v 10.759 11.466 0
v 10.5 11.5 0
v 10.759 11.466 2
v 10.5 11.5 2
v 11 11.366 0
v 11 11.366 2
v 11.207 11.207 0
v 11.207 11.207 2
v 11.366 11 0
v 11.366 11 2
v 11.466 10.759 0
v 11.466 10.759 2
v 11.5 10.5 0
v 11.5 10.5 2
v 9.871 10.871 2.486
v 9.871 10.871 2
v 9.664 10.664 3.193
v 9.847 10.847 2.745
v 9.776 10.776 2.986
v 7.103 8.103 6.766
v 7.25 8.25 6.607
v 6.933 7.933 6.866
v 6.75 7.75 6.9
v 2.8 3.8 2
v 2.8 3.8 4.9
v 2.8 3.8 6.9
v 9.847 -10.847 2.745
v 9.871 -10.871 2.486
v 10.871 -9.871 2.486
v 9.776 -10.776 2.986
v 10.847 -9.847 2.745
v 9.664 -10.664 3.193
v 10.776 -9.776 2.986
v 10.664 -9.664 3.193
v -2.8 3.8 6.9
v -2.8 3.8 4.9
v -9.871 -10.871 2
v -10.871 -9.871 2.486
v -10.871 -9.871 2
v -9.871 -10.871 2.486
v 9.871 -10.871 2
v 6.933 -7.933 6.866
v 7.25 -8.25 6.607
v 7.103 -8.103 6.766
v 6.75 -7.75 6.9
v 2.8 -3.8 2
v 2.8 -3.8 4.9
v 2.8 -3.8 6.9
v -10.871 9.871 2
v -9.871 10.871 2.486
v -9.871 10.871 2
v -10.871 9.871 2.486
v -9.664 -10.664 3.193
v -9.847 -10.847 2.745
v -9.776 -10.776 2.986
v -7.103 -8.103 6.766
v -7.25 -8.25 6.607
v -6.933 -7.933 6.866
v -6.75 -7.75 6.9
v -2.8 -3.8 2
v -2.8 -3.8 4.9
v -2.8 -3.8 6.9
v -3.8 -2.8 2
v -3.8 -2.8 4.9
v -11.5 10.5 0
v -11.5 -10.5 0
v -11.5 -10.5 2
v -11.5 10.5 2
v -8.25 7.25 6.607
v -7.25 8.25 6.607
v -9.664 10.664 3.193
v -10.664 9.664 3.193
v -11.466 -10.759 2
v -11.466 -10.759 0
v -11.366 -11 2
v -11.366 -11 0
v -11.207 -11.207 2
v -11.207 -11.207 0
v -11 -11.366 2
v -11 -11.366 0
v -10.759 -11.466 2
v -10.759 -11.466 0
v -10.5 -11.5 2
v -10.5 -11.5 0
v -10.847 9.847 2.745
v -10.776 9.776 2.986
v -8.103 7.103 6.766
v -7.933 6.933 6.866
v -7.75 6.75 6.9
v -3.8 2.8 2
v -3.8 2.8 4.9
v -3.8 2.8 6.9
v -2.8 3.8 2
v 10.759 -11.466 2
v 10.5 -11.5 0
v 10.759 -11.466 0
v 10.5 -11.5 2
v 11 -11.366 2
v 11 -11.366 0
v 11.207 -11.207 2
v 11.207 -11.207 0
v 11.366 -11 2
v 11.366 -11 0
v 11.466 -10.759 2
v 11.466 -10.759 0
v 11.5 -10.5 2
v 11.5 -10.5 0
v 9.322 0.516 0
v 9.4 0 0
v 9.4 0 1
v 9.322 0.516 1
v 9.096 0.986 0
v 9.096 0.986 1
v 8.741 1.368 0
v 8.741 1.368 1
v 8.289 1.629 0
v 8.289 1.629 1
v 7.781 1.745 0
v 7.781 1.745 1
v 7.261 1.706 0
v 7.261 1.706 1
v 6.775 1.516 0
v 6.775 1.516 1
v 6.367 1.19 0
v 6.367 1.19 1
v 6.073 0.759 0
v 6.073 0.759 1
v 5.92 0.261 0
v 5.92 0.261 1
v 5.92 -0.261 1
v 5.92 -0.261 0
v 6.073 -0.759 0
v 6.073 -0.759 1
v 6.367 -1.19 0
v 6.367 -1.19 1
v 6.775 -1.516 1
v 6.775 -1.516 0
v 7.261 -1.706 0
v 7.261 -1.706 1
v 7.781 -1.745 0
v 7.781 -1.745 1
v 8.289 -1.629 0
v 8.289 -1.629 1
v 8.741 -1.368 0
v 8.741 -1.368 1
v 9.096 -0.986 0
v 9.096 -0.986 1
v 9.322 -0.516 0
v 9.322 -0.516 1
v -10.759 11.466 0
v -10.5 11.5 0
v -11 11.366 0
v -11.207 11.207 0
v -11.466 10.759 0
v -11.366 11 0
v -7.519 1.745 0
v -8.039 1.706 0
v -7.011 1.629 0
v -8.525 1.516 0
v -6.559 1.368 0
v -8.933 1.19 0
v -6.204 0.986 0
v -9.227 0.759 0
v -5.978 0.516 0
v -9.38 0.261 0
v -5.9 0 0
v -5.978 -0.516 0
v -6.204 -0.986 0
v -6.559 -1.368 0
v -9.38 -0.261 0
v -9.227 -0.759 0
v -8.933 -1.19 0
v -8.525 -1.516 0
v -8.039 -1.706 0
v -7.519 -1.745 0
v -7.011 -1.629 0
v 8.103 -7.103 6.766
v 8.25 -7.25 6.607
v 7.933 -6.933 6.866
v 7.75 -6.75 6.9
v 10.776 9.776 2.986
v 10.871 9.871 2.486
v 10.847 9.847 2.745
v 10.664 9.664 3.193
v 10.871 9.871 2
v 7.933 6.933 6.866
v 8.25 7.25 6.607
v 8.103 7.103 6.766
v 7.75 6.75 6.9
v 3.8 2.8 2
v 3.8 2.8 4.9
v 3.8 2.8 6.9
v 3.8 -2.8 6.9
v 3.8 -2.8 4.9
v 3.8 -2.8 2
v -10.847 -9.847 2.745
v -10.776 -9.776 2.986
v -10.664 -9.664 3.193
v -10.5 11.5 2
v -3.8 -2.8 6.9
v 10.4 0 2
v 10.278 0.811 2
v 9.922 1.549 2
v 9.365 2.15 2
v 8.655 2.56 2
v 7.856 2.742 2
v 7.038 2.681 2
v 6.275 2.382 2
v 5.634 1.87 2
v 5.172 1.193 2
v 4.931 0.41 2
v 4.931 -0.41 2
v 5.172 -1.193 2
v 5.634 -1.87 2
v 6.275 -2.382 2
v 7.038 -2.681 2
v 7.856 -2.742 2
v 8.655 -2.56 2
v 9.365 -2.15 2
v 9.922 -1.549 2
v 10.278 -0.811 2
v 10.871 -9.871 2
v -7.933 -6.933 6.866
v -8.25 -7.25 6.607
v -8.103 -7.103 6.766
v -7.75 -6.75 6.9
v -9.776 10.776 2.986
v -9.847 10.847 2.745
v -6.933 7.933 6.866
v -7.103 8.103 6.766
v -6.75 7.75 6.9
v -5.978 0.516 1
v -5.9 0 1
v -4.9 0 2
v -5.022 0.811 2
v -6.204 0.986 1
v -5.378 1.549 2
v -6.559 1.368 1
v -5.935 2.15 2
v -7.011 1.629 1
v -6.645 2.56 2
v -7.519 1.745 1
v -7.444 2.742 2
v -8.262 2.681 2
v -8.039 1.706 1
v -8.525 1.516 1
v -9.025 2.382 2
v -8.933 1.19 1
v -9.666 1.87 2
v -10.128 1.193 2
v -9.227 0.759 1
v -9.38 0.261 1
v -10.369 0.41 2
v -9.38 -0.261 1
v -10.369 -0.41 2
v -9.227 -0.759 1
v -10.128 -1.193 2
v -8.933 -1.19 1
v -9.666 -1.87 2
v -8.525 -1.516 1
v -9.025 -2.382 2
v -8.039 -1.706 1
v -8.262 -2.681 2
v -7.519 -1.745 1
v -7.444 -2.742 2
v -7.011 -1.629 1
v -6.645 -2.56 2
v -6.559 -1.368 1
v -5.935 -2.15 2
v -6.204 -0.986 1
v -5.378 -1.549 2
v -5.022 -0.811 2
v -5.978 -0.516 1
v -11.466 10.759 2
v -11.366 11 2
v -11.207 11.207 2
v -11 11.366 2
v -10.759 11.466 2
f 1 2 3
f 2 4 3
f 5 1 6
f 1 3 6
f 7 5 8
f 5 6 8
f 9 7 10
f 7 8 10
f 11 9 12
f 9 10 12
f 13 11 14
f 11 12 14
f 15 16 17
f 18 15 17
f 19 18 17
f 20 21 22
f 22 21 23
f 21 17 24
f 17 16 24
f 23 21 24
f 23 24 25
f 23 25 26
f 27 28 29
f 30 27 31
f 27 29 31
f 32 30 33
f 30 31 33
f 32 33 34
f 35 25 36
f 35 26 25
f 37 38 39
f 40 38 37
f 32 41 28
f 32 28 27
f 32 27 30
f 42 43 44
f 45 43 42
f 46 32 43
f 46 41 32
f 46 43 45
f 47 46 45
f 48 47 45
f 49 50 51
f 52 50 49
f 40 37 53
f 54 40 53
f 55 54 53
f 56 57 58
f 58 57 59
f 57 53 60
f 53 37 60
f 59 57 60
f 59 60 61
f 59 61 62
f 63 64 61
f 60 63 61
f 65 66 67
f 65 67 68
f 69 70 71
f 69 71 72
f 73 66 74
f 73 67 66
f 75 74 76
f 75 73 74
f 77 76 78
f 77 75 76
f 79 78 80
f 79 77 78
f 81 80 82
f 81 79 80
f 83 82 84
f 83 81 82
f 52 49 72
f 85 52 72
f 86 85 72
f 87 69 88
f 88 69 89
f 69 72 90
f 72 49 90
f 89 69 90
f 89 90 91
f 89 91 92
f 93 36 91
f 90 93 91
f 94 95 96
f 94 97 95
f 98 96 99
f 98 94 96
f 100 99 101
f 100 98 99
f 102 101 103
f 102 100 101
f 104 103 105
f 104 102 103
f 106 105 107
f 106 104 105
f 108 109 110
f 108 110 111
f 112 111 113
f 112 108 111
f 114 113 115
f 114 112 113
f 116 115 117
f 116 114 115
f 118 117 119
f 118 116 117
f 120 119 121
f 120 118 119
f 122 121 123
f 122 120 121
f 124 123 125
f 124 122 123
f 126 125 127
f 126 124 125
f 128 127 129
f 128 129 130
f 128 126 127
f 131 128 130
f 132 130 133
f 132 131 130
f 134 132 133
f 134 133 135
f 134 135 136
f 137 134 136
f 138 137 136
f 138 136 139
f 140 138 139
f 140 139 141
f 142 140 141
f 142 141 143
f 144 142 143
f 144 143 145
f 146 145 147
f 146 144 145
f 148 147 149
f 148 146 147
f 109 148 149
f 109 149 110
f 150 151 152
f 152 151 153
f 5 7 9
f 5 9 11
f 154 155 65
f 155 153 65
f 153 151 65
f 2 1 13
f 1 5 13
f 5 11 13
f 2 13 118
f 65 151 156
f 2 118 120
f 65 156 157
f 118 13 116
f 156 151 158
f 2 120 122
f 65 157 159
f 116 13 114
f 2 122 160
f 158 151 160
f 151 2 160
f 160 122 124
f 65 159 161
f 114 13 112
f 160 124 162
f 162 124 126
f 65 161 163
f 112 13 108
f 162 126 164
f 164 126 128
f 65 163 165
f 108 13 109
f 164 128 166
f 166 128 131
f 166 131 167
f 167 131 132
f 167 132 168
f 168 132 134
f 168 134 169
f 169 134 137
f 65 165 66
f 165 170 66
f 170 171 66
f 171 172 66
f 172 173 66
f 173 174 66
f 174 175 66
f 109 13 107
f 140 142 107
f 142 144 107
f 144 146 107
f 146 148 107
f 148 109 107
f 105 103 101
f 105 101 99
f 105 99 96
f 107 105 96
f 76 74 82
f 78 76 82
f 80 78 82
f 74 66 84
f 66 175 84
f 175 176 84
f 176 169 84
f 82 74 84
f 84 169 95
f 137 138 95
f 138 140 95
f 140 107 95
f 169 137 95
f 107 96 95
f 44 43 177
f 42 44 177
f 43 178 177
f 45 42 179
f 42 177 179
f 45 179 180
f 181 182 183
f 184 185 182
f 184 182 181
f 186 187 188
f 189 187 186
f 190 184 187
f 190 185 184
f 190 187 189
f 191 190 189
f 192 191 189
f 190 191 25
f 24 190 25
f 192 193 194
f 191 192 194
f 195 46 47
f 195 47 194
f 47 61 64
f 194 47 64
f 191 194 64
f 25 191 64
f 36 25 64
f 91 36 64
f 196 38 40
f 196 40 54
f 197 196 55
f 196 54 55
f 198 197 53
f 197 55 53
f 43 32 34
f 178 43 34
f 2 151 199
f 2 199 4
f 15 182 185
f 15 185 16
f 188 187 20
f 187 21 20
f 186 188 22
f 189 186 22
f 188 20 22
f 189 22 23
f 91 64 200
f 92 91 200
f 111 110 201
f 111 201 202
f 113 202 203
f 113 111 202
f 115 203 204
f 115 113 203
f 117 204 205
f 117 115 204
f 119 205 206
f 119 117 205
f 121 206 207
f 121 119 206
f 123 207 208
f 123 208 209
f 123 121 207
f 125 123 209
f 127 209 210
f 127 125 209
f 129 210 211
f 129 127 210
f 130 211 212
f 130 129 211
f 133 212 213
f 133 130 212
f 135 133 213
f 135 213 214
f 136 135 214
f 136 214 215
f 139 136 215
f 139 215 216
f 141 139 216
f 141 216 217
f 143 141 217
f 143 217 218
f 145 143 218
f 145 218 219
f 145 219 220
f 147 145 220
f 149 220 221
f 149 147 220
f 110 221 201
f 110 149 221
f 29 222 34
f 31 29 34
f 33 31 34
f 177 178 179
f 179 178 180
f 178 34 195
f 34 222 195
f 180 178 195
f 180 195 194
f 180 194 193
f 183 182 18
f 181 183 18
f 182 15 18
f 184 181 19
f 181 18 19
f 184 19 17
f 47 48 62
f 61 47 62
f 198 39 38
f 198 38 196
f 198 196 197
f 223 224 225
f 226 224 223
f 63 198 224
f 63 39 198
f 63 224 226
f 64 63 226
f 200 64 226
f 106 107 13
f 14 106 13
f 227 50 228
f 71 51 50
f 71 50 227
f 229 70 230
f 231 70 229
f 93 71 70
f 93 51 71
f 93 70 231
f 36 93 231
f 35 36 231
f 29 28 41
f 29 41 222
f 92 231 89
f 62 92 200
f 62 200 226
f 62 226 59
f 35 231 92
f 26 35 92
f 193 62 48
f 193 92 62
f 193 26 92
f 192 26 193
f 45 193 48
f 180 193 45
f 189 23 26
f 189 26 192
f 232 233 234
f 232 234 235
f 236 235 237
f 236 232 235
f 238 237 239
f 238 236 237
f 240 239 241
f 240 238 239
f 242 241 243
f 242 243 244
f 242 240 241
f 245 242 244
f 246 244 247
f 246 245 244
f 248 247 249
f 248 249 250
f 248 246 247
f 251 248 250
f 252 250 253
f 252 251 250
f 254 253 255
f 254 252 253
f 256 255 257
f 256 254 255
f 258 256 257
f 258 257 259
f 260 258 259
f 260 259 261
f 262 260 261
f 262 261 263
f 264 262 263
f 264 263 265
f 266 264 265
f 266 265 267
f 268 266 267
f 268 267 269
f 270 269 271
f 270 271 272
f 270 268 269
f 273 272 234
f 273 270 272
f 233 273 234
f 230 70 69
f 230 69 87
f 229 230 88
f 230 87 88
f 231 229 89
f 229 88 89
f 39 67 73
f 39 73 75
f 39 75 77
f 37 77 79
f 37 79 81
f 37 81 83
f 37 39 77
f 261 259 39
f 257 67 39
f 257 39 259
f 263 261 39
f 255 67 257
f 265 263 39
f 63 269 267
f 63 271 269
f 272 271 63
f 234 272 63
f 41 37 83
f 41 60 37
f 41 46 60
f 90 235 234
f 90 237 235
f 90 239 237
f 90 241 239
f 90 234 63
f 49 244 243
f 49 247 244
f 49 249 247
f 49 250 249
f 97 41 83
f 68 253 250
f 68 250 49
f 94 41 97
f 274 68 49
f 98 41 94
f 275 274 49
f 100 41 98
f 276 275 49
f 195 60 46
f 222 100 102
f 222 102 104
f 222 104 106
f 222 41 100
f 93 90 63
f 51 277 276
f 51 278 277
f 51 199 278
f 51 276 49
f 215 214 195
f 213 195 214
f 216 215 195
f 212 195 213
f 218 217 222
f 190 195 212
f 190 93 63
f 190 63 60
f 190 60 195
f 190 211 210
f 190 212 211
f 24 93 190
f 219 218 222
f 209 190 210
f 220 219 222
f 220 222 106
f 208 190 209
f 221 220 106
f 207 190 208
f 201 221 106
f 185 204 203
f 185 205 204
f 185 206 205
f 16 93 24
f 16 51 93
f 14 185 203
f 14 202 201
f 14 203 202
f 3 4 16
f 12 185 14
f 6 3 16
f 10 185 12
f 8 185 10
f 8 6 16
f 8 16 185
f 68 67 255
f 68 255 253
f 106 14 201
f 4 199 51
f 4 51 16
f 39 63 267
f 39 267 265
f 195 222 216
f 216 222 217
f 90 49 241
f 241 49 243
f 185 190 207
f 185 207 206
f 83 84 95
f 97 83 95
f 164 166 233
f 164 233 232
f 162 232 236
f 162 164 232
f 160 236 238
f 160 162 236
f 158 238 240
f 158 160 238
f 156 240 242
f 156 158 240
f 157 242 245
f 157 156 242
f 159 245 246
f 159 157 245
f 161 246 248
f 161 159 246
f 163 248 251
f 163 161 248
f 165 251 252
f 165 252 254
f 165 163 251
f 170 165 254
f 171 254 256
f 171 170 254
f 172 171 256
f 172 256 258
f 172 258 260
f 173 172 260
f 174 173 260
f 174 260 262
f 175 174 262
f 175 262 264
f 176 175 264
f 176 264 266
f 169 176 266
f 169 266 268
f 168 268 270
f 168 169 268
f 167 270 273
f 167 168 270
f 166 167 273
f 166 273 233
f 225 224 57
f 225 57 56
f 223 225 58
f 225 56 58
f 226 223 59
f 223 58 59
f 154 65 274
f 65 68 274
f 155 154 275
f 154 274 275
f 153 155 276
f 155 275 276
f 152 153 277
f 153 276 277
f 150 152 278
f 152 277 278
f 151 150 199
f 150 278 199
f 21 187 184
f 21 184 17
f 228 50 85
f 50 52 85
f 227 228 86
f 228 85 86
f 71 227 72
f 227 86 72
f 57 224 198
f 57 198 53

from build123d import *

# Parameters (mm, degrees)
SKETCH_W           = 23
SKETCH_H           = 23
SKETCH_R           = 1.75
PAD_DEPTH          = 2
FILLET_R           = 1
CHAMFER_SIZE       = 1
PAD002_DEPTH       = 3.8
CHAMFER002_SIZE    = 1
SKETCH003_W        = 1.414214
SKETCH003_H        = 6.9
PAD003_DEPTH       = 10
POLARPATTERN_COUNT = 4
CHAMFER003_SIZE    = 4
SKETCH004_W        = 2.365725
SKETCH004_H        = 2.9
POCKET_DEPTH       = 11.501
POCKET_DEPTH_BACK  = -11.501
FILLET001_R        = 1


with BuildPart() as part:
    # Sketch → Pad (new body)
    with BuildSketch(Plane.XY):
        Rectangle(SKETCH_W, SKETCH_H)
        with Locations((-7.65, 0)):
            Circle(SKETCH_R, mode=Mode.SUBTRACT)
        with Locations((7.65, 0)):
            Circle(SKETCH_R, mode=Mode.SUBTRACT)
    extrude(amount=PAD_DEPTH)

    # Fillet
    fillet_edges = [part.edges().sort_by_distance(p)[0] for p in [
        (-11.5, 11.5, 1),
        (-11.5, -11.5, 1),
        (11.5, -11.5, 1),
        (11.5, 11.5, 1),
    ]]
    fillet(fillet_edges, radius=FILLET_R)

    # Chamfer
    chamfer_edges = [part.edges().sort_by_distance(p)[0] for p in [
        (-9.4, 0, 2),
        (5.9, 0, 2),
    ]]
    chamfer(chamfer_edges, length=CHAMFER_SIZE)

    # Sketch002 → Pad002 (join, symmetric)
    with BuildSketch(Plane.XZ):
        Polygon((-3.8, 6.9), (3.8, 6.9), (3.8, 4.9), (0.340708, 4.9), (0.340708, 0), (-0.340708, 0), (-0.340708, 4.9), (-3.8, 4.9), align=None)
    extrude(amount=PAD002_DEPTH, both=True)

    # Chamfer002
    chamfer002_edges = [part.edges().sort_by_distance(p)[0] for p in [
        (-3.8, -3.8, 5.9),
        (-3.8, 3.8, 5.9),
        (3.8, -3.8, 5.9),
        (3.8, 3.8, 5.9),
    ]]
    chamfer(chamfer002_edges, length=CHAMFER002_SIZE)

    # Sketch003 (on Face3 of Chamfer002) → Pad003 (join)
    with BuildSketch(Plane(origin=(-3.3, -3.3, 0), x_dir=(0.707107, -0.707107, 0), z_dir=(-0.707107, -0.707107, 0))):
        with Locations((0, 3.45)):
            Rectangle(SKETCH003_W, SKETCH003_H)
    pad003 = extrude(amount=PAD003_DEPTH)

    # PolarPattern: Pad003 ×4 about axis
    polarpattern_axis = Axis((0, 0, 0), (0, 0, 1))
    for i in range(1, POLARPATTERN_COUNT):
        add(pad003.rotate(polarpattern_axis, i * 360 / POLARPATTERN_COUNT))

    # Chamfer003
    chamfer003_edges = [part.edges().sort_by_distance(p)[0] for p in [
        (10.371068, -10.371068, 6.9),
        (10.371068, 10.371068, 6.9),
        (-10.371068, 10.371068, 6.9),
        (-10.371068, -10.371068, 6.9),
    ]]
    chamfer(chamfer003_edges, length=CHAMFER003_SIZE)

    # Sketch004 → Pocket (cut, two sides)
    with BuildSketch(Plane.XZ) as pocket_sk:
        with Locations((0.122459, 3.45)):
            Rectangle(SKETCH004_W, SKETCH004_H)
    extrude(amount=-POCKET_DEPTH, mode=Mode.SUBTRACT)
    extrude(pocket_sk.sketch, amount=-POCKET_DEPTH_BACK, mode=Mode.SUBTRACT)

    # Fillet001
    fillet001_edges = [part.edges().sort_by_distance(p)[0] for p in [
        (-10.371068, -10.371068, 2.9),
        (10.371068, -10.371068, 2.9),
        (7.542641, -7.542641, 6.9),
        (-7.542641, -7.542641, 6.9),
        (-7.542641, 7.542641, 6.9),
        (7.542641, 7.542641, 6.9),
        (10.371068, 10.371068, 2.9),
        (-10.371068, 10.371068, 2.9),
    ]]
    fillet(fillet001_edges, radius=FILLET001_R)


solid = part.part
